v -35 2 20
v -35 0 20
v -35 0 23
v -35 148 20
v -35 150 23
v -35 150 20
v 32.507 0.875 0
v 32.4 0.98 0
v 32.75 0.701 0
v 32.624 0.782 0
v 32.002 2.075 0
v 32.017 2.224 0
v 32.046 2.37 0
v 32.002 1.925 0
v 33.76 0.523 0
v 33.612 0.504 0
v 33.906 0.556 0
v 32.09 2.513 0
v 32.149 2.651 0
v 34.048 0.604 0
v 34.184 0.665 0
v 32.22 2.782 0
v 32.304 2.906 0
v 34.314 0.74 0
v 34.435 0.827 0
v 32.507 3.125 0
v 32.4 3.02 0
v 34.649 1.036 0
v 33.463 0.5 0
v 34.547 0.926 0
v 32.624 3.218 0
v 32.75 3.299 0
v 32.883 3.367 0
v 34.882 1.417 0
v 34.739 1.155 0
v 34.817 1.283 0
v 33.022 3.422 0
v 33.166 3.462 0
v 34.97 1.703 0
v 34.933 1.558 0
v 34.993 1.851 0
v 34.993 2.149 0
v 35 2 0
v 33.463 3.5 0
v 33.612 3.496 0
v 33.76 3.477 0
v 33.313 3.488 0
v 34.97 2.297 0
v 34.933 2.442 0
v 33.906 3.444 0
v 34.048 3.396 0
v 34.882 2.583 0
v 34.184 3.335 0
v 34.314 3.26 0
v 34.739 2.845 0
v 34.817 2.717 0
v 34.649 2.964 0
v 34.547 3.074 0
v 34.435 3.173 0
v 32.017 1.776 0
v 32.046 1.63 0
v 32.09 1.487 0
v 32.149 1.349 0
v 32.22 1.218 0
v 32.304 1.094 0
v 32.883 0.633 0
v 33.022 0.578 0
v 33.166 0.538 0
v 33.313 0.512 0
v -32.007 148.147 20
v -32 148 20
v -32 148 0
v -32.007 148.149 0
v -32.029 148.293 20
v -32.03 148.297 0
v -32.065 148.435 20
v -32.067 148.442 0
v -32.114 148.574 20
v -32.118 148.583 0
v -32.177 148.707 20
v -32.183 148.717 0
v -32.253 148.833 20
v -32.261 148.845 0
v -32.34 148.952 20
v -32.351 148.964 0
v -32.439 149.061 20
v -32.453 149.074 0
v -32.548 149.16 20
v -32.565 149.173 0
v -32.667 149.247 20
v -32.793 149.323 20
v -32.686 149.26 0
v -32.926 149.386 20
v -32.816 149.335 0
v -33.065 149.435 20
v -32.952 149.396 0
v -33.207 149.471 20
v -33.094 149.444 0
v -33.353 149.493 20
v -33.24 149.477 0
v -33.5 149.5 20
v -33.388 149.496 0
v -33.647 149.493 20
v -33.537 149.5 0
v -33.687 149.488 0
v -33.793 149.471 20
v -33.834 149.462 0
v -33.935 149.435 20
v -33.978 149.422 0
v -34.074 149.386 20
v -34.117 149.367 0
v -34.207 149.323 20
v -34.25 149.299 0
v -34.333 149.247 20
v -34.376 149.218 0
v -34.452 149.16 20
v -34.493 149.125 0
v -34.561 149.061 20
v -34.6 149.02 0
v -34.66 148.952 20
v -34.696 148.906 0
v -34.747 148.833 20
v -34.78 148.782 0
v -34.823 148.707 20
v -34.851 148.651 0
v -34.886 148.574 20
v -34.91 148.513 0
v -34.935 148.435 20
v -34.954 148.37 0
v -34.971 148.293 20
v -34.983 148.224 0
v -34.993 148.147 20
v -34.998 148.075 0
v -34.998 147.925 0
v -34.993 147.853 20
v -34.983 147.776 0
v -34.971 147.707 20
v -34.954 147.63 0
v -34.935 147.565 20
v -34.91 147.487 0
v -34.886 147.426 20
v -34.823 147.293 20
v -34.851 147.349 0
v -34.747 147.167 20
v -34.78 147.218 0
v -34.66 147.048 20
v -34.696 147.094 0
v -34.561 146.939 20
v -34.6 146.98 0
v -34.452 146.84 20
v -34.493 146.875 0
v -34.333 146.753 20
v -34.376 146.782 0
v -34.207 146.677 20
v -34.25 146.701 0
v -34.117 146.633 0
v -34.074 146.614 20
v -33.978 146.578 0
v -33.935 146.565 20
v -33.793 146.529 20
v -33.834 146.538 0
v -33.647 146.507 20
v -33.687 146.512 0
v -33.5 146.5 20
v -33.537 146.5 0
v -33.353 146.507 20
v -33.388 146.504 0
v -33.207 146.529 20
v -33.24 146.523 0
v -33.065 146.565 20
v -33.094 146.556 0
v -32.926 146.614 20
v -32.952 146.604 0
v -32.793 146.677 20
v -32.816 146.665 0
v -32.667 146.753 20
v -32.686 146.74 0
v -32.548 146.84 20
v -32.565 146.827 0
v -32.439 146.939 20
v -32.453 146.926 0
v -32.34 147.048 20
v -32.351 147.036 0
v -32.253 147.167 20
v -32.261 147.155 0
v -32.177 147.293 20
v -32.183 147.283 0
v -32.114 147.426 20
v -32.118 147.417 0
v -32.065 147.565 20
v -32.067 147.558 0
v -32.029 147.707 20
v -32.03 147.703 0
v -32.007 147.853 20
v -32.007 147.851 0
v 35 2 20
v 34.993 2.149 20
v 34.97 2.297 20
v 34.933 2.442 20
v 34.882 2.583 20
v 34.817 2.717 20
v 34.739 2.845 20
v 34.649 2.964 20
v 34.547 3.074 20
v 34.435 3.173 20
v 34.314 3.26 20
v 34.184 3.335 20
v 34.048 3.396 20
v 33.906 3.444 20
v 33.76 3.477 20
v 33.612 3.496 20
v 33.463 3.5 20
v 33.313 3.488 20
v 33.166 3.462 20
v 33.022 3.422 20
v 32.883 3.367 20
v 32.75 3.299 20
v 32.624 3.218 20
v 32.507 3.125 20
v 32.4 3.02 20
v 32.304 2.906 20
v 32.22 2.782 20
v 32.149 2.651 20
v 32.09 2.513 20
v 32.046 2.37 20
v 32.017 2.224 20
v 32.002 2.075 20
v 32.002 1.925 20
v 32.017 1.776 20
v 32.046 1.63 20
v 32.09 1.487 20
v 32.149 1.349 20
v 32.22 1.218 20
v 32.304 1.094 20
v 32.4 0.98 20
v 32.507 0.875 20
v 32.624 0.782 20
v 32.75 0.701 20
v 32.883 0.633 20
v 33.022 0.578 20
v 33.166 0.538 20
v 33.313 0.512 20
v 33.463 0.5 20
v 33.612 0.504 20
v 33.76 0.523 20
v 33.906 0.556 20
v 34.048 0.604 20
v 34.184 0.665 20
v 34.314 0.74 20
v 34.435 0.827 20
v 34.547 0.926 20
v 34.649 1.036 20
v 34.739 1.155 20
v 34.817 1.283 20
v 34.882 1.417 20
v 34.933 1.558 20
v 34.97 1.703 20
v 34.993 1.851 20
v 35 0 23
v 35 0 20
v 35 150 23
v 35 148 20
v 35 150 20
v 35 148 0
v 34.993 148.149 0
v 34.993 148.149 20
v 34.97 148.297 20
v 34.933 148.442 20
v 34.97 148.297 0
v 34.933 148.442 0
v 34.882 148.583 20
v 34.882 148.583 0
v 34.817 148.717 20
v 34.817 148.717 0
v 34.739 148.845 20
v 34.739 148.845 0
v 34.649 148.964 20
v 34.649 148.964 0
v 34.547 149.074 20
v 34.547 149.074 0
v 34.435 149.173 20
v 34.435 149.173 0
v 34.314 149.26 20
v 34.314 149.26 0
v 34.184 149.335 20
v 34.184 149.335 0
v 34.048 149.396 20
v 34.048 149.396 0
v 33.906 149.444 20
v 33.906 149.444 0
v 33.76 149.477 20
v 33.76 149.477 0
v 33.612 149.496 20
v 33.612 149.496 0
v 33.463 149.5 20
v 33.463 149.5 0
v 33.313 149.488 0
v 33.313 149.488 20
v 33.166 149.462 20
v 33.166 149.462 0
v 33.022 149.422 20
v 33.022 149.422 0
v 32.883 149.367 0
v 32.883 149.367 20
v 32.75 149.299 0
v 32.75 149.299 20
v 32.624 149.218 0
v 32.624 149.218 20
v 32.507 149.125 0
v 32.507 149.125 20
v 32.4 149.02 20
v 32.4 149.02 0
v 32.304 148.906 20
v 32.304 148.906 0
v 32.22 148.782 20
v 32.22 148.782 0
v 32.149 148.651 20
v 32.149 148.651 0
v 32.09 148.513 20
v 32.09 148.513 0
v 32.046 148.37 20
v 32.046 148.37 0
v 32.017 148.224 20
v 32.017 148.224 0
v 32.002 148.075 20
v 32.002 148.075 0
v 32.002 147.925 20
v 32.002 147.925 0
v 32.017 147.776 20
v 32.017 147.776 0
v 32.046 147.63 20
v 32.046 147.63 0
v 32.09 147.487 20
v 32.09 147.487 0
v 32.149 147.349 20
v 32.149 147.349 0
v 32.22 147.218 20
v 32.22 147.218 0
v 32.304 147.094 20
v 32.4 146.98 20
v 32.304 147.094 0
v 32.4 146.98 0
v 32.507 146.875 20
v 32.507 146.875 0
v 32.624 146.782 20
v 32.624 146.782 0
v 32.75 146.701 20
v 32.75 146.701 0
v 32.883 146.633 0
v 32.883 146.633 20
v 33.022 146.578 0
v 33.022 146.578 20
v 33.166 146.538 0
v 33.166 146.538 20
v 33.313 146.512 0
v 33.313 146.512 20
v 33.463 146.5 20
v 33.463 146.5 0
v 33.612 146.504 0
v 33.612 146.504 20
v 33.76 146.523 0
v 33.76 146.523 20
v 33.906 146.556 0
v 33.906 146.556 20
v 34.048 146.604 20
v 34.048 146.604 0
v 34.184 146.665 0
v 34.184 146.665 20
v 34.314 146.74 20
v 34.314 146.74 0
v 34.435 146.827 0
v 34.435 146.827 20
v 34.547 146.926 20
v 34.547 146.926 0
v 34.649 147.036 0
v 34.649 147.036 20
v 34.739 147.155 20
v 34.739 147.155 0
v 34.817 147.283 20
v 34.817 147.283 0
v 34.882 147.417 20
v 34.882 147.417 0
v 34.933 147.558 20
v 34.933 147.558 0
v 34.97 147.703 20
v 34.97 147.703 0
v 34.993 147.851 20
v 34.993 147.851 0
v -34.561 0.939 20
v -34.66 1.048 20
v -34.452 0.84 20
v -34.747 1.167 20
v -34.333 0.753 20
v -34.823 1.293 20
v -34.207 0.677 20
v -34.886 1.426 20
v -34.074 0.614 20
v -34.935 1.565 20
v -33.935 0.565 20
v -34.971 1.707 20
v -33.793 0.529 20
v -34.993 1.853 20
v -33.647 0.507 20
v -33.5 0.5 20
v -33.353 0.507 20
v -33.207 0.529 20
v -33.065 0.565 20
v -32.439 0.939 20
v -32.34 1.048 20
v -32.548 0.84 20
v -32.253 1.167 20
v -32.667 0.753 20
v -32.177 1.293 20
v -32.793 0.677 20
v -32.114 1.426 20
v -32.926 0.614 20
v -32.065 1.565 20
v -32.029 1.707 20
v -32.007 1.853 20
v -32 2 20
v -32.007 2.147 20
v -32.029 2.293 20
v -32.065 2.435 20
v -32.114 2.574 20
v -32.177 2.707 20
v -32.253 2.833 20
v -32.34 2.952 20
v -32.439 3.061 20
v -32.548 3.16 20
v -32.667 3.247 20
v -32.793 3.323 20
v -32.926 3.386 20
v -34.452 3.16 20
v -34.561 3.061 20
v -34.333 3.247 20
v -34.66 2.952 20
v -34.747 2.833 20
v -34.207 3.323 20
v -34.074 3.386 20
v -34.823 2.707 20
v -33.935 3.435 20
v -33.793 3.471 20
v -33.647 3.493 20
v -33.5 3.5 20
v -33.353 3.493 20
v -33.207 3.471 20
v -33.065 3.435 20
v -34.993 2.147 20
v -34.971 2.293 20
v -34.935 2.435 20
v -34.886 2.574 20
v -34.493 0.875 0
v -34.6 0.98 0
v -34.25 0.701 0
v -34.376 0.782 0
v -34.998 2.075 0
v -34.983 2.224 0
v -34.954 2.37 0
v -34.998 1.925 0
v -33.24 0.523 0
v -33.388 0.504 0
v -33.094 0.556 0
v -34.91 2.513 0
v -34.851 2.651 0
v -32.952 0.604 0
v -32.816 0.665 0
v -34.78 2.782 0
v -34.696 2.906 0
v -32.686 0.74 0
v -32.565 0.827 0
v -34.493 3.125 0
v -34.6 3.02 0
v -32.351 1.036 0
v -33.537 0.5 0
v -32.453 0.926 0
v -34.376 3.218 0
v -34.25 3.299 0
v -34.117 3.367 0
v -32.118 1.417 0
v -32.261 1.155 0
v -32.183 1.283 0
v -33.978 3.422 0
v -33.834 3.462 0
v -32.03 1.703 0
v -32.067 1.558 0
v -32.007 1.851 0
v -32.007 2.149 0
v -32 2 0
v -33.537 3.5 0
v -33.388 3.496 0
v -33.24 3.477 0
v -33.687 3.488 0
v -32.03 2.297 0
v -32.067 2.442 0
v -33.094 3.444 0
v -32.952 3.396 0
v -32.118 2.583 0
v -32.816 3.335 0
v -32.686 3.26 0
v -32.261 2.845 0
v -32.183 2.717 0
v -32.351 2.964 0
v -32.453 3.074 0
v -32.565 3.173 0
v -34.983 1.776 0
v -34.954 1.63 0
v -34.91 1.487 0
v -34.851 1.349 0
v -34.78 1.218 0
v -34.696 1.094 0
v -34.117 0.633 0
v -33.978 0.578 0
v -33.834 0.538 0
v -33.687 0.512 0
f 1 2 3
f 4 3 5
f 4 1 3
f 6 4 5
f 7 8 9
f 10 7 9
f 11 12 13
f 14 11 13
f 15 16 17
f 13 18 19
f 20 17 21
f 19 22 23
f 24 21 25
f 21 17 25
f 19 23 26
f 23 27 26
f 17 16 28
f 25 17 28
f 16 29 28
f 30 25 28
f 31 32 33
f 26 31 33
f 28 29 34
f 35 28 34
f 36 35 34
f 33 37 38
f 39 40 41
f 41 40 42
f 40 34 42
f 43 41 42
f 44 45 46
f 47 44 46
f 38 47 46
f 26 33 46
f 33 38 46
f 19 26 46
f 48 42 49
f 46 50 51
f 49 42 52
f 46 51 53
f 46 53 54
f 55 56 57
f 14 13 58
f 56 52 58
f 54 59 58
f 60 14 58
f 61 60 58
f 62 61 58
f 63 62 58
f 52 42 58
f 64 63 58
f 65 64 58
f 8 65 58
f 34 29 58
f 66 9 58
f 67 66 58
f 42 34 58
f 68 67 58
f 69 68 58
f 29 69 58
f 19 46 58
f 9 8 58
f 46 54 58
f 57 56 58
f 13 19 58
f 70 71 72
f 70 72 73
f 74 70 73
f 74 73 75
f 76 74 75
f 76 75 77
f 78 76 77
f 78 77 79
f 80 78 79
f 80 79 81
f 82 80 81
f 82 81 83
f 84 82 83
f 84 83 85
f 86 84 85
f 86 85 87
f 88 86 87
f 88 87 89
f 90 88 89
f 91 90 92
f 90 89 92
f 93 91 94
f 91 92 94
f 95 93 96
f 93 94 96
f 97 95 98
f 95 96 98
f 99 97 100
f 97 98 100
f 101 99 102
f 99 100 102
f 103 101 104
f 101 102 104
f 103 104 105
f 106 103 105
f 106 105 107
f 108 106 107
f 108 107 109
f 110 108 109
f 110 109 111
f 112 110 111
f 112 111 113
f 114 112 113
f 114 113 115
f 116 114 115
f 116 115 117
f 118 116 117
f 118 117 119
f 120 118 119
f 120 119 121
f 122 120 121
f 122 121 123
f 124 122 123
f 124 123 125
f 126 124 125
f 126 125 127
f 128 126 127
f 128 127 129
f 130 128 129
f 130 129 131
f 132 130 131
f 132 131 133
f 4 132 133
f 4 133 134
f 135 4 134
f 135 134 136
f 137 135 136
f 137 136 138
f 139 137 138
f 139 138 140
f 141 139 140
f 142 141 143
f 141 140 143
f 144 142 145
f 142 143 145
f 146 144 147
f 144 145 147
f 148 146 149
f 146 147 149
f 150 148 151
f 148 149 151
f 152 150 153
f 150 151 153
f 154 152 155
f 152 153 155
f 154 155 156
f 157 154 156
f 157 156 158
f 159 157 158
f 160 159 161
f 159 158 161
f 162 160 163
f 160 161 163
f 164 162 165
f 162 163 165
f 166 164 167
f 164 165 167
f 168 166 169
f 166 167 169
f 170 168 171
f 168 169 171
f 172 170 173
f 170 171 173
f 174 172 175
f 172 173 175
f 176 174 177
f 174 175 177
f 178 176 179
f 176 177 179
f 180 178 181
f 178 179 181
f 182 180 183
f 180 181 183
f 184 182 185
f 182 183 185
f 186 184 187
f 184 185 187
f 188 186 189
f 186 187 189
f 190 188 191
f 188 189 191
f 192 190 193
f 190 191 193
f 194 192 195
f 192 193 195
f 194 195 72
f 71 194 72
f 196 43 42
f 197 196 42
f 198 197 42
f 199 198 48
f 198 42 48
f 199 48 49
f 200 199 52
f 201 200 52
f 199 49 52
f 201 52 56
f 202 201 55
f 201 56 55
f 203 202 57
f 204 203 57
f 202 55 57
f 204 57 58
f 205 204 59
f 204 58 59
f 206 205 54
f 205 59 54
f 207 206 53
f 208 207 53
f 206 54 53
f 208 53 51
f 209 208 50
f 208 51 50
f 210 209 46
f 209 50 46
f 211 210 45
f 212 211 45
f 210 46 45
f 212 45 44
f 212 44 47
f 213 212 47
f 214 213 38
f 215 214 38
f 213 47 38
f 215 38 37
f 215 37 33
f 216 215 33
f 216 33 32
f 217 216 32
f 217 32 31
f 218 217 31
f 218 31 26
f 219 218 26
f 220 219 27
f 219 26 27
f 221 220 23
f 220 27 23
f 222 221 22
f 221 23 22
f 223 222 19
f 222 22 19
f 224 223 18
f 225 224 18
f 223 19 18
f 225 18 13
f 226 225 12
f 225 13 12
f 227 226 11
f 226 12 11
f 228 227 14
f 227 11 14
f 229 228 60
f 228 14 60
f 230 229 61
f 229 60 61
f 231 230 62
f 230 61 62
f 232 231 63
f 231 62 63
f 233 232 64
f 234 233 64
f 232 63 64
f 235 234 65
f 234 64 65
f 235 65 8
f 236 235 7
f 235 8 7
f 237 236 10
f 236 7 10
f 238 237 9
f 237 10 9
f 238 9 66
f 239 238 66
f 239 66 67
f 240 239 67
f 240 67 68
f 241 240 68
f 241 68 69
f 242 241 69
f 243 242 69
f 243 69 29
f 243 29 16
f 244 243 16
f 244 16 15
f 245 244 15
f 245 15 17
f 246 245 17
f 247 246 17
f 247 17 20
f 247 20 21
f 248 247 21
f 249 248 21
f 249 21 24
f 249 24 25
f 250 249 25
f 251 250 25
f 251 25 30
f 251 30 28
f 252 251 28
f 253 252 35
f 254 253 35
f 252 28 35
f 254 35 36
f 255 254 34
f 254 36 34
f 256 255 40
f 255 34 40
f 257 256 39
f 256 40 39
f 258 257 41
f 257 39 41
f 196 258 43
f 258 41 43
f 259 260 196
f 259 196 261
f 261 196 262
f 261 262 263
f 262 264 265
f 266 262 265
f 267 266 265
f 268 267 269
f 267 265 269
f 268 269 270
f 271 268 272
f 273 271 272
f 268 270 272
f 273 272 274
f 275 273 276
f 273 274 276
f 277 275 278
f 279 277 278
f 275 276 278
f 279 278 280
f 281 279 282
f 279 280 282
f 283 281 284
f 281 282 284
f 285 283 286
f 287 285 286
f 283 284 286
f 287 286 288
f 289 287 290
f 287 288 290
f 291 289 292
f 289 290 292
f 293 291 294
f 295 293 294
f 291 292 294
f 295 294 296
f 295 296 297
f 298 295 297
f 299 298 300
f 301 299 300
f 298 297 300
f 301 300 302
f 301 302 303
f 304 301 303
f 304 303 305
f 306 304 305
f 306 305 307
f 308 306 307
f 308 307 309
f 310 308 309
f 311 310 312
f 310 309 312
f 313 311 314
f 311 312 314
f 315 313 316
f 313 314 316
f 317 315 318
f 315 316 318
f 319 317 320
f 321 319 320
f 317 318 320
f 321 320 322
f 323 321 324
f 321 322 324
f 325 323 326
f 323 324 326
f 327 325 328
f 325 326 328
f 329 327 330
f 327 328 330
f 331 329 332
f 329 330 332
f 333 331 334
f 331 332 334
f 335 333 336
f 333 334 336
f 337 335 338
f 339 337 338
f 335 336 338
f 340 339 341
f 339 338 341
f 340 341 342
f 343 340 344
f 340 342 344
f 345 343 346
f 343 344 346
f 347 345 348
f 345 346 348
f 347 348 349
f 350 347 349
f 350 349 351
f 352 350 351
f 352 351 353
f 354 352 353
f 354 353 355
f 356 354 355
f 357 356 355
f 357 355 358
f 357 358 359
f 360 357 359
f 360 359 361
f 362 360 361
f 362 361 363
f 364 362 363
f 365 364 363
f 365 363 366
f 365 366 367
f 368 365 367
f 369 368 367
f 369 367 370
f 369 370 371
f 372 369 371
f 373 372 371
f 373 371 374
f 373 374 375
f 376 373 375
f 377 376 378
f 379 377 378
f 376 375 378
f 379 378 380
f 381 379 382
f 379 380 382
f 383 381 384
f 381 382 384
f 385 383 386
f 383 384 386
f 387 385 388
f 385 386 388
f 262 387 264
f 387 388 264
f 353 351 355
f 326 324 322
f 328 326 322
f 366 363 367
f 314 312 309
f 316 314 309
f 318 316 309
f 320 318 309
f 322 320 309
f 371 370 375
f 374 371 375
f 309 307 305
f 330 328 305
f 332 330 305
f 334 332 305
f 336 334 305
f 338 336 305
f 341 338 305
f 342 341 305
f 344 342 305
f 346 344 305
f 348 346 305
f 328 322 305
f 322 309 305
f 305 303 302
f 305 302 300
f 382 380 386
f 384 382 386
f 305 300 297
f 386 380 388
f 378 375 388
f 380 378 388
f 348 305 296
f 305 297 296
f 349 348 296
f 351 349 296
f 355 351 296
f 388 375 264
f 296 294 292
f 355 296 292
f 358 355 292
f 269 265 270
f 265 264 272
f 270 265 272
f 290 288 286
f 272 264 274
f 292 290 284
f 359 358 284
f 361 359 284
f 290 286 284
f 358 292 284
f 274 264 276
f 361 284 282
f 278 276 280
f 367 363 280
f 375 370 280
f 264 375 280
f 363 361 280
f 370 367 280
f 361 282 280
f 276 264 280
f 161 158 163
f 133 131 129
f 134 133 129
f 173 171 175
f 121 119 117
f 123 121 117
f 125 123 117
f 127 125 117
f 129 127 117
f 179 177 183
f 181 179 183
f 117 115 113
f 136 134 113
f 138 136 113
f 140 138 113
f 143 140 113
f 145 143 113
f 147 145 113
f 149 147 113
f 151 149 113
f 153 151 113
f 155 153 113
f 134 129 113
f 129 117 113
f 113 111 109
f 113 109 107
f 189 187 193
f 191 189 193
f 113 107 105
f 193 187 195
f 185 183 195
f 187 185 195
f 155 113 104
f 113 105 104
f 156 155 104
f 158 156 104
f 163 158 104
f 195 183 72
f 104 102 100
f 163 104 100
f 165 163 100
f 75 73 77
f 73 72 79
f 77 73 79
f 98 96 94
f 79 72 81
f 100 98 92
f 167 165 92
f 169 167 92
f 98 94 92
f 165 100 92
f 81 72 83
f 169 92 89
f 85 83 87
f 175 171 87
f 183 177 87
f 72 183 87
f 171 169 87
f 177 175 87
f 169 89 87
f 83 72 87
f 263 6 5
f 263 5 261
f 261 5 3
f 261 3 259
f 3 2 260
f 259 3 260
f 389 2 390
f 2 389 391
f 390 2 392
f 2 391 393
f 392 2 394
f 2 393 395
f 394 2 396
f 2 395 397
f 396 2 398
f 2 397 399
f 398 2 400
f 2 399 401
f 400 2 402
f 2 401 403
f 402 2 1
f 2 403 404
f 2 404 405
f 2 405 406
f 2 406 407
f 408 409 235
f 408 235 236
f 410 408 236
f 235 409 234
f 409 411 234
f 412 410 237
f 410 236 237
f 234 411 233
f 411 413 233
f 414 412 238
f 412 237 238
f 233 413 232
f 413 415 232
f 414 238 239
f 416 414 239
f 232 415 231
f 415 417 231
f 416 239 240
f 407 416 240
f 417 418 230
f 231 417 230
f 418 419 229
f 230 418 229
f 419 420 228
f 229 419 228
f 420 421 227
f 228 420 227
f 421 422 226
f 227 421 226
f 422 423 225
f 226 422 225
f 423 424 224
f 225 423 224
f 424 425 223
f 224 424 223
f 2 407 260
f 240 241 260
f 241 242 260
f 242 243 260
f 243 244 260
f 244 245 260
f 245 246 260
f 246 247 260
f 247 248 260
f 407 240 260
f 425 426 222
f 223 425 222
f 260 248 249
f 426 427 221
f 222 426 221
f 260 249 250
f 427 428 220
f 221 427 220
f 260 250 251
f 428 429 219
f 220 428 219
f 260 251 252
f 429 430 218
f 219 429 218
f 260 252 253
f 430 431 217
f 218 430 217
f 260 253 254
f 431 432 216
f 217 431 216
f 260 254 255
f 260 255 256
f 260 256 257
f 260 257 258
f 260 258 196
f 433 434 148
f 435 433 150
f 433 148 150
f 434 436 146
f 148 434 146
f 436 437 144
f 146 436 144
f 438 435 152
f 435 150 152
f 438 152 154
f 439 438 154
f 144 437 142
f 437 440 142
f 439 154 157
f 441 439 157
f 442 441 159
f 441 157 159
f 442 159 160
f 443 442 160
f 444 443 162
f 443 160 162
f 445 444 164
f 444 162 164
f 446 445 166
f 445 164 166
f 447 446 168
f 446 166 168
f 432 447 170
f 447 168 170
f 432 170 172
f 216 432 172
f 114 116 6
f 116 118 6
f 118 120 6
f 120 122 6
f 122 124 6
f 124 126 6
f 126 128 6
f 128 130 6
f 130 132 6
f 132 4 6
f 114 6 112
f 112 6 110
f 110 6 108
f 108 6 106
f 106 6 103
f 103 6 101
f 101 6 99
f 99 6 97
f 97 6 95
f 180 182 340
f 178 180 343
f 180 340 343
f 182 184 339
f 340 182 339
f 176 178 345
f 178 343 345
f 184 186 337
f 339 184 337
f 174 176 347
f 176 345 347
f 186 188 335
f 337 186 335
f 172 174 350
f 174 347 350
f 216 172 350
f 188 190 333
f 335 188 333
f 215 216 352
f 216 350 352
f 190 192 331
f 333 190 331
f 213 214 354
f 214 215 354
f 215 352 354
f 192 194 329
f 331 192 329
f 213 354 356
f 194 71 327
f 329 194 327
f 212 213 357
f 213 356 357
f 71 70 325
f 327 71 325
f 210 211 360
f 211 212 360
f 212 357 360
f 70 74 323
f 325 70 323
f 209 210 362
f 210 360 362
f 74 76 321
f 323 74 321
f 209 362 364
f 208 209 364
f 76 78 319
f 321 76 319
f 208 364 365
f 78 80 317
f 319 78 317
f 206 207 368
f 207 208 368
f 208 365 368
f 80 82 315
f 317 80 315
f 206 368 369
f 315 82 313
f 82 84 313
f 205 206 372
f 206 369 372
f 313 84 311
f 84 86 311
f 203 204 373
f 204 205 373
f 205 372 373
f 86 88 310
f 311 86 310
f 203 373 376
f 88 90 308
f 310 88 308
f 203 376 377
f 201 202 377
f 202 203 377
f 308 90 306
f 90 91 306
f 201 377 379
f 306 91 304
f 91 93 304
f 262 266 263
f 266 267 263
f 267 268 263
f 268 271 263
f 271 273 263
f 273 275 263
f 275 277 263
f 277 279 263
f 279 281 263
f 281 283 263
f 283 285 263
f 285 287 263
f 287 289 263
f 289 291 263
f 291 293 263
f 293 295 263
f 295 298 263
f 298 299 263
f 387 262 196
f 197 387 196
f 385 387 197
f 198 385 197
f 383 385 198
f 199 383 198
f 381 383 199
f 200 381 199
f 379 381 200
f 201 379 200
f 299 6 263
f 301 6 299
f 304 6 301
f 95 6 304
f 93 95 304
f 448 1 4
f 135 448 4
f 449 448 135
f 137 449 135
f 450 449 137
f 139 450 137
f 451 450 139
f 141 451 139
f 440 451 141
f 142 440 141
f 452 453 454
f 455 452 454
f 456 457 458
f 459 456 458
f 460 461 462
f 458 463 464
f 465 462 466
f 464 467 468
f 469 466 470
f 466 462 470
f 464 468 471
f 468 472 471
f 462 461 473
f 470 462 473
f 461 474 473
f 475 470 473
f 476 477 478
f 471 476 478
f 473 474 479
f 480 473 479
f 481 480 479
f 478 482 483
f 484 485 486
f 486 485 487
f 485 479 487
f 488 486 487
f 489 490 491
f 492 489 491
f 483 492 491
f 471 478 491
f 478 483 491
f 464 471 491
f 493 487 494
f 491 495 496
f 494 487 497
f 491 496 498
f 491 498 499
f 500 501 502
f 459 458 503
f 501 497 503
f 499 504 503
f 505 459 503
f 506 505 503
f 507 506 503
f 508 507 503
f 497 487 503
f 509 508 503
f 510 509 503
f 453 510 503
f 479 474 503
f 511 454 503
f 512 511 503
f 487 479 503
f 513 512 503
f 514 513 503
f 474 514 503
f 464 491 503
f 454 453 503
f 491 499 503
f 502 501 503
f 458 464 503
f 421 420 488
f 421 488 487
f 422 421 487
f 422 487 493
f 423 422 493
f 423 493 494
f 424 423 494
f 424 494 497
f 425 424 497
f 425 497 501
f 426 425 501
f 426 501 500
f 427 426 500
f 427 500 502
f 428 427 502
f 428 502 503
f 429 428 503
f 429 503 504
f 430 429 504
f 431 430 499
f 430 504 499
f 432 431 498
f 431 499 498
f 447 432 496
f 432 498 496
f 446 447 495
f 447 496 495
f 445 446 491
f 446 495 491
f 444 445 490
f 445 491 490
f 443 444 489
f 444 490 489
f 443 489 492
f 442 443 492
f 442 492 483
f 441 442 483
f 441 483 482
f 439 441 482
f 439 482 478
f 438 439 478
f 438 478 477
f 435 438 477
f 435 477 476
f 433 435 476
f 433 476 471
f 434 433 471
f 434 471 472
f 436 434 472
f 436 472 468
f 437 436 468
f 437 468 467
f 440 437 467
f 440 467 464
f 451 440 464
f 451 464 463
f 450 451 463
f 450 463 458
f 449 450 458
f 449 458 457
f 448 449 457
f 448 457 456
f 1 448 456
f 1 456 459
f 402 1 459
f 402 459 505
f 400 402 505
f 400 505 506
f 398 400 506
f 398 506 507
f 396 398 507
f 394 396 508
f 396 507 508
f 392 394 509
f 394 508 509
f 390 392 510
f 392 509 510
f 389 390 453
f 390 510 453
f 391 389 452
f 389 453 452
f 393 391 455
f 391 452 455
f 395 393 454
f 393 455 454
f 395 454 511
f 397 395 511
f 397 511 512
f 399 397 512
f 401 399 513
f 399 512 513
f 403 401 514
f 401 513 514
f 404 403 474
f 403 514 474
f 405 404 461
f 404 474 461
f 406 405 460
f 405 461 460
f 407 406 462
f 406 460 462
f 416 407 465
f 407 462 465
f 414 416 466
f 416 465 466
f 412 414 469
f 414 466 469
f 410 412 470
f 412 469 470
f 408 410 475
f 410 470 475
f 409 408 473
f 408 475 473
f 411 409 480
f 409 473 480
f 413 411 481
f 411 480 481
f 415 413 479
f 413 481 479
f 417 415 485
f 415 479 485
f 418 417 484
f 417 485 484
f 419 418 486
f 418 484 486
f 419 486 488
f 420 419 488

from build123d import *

# Parameters (mm, degrees)
ESBO_O1_R                  = 1.5
RESSALTO_EXTRUS_O1_DEPTH   = 20
RESSALTO_EXTRUS_O1_2_DEPTH = 20
RESSALTO_EXTRUS_O1_3_DEPTH = 20
RESSALTO_EXTRUS_O1_4_DEPTH = 20
ESBO_O2_W                  = 70
ESBO_O2_H                  = 150
RESSALTO_EXTRUS_O2_DEPTH   = 3


with BuildPart() as part:
    # Esboço1 → Ressalto-extrusão1 (new body)
    with BuildSketch(Plane.XY):
        with Locations((33.5, 148)):
            Circle(ESBO_O1_R)
    extrude(amount=RESSALTO_EXTRUS_O1_DEPTH)



with BuildPart() as body_2:
    # Esboço1 → Ressalto-extrus_o1 2 (new body)
    with BuildSketch(Plane.XY):
        with Locations((-33.5, 148)):
            Circle(ESBO_O1_R)
    extrude(amount=RESSALTO_EXTRUS_O1_2_DEPTH)


with BuildPart() as body_3:
    # Esboço1 → Ressalto-extrus_o1 3 (new body)
    with BuildSketch(Plane.XY):
        with Locations((33.5, 2)):
            Circle(ESBO_O1_R)
    extrude(amount=RESSALTO_EXTRUS_O1_3_DEPTH)


with BuildPart() as body_4:
    # Esboço1 → Ressalto-extrus_o1 4 (new body)
    with BuildSketch(Plane.XY):
        with Locations((-33.5, 2)):
            Circle(ESBO_O1_R)
    extrude(amount=RESSALTO_EXTRUS_O1_4_DEPTH)


with BuildPart() as part_1:
    add(part.part)

    add(body_2.part)  # Ressalto-extrusão2 merges body 2

    add(body_3.part)  # Ressalto-extrusão2 merges body 3

    add(body_4.part)  # Ressalto-extrusão2 merges body 4
    # Esboço2 → Ressalto-extrusão2 (add)
    with BuildSketch(Plane.XY.offset(20)):
        with Locations((0, 75)):
            Rectangle(ESBO_O2_W, ESBO_O2_H)
    extrude(amount=RESSALTO_EXTRUS_O2_DEPTH)


solid = part_1.part
